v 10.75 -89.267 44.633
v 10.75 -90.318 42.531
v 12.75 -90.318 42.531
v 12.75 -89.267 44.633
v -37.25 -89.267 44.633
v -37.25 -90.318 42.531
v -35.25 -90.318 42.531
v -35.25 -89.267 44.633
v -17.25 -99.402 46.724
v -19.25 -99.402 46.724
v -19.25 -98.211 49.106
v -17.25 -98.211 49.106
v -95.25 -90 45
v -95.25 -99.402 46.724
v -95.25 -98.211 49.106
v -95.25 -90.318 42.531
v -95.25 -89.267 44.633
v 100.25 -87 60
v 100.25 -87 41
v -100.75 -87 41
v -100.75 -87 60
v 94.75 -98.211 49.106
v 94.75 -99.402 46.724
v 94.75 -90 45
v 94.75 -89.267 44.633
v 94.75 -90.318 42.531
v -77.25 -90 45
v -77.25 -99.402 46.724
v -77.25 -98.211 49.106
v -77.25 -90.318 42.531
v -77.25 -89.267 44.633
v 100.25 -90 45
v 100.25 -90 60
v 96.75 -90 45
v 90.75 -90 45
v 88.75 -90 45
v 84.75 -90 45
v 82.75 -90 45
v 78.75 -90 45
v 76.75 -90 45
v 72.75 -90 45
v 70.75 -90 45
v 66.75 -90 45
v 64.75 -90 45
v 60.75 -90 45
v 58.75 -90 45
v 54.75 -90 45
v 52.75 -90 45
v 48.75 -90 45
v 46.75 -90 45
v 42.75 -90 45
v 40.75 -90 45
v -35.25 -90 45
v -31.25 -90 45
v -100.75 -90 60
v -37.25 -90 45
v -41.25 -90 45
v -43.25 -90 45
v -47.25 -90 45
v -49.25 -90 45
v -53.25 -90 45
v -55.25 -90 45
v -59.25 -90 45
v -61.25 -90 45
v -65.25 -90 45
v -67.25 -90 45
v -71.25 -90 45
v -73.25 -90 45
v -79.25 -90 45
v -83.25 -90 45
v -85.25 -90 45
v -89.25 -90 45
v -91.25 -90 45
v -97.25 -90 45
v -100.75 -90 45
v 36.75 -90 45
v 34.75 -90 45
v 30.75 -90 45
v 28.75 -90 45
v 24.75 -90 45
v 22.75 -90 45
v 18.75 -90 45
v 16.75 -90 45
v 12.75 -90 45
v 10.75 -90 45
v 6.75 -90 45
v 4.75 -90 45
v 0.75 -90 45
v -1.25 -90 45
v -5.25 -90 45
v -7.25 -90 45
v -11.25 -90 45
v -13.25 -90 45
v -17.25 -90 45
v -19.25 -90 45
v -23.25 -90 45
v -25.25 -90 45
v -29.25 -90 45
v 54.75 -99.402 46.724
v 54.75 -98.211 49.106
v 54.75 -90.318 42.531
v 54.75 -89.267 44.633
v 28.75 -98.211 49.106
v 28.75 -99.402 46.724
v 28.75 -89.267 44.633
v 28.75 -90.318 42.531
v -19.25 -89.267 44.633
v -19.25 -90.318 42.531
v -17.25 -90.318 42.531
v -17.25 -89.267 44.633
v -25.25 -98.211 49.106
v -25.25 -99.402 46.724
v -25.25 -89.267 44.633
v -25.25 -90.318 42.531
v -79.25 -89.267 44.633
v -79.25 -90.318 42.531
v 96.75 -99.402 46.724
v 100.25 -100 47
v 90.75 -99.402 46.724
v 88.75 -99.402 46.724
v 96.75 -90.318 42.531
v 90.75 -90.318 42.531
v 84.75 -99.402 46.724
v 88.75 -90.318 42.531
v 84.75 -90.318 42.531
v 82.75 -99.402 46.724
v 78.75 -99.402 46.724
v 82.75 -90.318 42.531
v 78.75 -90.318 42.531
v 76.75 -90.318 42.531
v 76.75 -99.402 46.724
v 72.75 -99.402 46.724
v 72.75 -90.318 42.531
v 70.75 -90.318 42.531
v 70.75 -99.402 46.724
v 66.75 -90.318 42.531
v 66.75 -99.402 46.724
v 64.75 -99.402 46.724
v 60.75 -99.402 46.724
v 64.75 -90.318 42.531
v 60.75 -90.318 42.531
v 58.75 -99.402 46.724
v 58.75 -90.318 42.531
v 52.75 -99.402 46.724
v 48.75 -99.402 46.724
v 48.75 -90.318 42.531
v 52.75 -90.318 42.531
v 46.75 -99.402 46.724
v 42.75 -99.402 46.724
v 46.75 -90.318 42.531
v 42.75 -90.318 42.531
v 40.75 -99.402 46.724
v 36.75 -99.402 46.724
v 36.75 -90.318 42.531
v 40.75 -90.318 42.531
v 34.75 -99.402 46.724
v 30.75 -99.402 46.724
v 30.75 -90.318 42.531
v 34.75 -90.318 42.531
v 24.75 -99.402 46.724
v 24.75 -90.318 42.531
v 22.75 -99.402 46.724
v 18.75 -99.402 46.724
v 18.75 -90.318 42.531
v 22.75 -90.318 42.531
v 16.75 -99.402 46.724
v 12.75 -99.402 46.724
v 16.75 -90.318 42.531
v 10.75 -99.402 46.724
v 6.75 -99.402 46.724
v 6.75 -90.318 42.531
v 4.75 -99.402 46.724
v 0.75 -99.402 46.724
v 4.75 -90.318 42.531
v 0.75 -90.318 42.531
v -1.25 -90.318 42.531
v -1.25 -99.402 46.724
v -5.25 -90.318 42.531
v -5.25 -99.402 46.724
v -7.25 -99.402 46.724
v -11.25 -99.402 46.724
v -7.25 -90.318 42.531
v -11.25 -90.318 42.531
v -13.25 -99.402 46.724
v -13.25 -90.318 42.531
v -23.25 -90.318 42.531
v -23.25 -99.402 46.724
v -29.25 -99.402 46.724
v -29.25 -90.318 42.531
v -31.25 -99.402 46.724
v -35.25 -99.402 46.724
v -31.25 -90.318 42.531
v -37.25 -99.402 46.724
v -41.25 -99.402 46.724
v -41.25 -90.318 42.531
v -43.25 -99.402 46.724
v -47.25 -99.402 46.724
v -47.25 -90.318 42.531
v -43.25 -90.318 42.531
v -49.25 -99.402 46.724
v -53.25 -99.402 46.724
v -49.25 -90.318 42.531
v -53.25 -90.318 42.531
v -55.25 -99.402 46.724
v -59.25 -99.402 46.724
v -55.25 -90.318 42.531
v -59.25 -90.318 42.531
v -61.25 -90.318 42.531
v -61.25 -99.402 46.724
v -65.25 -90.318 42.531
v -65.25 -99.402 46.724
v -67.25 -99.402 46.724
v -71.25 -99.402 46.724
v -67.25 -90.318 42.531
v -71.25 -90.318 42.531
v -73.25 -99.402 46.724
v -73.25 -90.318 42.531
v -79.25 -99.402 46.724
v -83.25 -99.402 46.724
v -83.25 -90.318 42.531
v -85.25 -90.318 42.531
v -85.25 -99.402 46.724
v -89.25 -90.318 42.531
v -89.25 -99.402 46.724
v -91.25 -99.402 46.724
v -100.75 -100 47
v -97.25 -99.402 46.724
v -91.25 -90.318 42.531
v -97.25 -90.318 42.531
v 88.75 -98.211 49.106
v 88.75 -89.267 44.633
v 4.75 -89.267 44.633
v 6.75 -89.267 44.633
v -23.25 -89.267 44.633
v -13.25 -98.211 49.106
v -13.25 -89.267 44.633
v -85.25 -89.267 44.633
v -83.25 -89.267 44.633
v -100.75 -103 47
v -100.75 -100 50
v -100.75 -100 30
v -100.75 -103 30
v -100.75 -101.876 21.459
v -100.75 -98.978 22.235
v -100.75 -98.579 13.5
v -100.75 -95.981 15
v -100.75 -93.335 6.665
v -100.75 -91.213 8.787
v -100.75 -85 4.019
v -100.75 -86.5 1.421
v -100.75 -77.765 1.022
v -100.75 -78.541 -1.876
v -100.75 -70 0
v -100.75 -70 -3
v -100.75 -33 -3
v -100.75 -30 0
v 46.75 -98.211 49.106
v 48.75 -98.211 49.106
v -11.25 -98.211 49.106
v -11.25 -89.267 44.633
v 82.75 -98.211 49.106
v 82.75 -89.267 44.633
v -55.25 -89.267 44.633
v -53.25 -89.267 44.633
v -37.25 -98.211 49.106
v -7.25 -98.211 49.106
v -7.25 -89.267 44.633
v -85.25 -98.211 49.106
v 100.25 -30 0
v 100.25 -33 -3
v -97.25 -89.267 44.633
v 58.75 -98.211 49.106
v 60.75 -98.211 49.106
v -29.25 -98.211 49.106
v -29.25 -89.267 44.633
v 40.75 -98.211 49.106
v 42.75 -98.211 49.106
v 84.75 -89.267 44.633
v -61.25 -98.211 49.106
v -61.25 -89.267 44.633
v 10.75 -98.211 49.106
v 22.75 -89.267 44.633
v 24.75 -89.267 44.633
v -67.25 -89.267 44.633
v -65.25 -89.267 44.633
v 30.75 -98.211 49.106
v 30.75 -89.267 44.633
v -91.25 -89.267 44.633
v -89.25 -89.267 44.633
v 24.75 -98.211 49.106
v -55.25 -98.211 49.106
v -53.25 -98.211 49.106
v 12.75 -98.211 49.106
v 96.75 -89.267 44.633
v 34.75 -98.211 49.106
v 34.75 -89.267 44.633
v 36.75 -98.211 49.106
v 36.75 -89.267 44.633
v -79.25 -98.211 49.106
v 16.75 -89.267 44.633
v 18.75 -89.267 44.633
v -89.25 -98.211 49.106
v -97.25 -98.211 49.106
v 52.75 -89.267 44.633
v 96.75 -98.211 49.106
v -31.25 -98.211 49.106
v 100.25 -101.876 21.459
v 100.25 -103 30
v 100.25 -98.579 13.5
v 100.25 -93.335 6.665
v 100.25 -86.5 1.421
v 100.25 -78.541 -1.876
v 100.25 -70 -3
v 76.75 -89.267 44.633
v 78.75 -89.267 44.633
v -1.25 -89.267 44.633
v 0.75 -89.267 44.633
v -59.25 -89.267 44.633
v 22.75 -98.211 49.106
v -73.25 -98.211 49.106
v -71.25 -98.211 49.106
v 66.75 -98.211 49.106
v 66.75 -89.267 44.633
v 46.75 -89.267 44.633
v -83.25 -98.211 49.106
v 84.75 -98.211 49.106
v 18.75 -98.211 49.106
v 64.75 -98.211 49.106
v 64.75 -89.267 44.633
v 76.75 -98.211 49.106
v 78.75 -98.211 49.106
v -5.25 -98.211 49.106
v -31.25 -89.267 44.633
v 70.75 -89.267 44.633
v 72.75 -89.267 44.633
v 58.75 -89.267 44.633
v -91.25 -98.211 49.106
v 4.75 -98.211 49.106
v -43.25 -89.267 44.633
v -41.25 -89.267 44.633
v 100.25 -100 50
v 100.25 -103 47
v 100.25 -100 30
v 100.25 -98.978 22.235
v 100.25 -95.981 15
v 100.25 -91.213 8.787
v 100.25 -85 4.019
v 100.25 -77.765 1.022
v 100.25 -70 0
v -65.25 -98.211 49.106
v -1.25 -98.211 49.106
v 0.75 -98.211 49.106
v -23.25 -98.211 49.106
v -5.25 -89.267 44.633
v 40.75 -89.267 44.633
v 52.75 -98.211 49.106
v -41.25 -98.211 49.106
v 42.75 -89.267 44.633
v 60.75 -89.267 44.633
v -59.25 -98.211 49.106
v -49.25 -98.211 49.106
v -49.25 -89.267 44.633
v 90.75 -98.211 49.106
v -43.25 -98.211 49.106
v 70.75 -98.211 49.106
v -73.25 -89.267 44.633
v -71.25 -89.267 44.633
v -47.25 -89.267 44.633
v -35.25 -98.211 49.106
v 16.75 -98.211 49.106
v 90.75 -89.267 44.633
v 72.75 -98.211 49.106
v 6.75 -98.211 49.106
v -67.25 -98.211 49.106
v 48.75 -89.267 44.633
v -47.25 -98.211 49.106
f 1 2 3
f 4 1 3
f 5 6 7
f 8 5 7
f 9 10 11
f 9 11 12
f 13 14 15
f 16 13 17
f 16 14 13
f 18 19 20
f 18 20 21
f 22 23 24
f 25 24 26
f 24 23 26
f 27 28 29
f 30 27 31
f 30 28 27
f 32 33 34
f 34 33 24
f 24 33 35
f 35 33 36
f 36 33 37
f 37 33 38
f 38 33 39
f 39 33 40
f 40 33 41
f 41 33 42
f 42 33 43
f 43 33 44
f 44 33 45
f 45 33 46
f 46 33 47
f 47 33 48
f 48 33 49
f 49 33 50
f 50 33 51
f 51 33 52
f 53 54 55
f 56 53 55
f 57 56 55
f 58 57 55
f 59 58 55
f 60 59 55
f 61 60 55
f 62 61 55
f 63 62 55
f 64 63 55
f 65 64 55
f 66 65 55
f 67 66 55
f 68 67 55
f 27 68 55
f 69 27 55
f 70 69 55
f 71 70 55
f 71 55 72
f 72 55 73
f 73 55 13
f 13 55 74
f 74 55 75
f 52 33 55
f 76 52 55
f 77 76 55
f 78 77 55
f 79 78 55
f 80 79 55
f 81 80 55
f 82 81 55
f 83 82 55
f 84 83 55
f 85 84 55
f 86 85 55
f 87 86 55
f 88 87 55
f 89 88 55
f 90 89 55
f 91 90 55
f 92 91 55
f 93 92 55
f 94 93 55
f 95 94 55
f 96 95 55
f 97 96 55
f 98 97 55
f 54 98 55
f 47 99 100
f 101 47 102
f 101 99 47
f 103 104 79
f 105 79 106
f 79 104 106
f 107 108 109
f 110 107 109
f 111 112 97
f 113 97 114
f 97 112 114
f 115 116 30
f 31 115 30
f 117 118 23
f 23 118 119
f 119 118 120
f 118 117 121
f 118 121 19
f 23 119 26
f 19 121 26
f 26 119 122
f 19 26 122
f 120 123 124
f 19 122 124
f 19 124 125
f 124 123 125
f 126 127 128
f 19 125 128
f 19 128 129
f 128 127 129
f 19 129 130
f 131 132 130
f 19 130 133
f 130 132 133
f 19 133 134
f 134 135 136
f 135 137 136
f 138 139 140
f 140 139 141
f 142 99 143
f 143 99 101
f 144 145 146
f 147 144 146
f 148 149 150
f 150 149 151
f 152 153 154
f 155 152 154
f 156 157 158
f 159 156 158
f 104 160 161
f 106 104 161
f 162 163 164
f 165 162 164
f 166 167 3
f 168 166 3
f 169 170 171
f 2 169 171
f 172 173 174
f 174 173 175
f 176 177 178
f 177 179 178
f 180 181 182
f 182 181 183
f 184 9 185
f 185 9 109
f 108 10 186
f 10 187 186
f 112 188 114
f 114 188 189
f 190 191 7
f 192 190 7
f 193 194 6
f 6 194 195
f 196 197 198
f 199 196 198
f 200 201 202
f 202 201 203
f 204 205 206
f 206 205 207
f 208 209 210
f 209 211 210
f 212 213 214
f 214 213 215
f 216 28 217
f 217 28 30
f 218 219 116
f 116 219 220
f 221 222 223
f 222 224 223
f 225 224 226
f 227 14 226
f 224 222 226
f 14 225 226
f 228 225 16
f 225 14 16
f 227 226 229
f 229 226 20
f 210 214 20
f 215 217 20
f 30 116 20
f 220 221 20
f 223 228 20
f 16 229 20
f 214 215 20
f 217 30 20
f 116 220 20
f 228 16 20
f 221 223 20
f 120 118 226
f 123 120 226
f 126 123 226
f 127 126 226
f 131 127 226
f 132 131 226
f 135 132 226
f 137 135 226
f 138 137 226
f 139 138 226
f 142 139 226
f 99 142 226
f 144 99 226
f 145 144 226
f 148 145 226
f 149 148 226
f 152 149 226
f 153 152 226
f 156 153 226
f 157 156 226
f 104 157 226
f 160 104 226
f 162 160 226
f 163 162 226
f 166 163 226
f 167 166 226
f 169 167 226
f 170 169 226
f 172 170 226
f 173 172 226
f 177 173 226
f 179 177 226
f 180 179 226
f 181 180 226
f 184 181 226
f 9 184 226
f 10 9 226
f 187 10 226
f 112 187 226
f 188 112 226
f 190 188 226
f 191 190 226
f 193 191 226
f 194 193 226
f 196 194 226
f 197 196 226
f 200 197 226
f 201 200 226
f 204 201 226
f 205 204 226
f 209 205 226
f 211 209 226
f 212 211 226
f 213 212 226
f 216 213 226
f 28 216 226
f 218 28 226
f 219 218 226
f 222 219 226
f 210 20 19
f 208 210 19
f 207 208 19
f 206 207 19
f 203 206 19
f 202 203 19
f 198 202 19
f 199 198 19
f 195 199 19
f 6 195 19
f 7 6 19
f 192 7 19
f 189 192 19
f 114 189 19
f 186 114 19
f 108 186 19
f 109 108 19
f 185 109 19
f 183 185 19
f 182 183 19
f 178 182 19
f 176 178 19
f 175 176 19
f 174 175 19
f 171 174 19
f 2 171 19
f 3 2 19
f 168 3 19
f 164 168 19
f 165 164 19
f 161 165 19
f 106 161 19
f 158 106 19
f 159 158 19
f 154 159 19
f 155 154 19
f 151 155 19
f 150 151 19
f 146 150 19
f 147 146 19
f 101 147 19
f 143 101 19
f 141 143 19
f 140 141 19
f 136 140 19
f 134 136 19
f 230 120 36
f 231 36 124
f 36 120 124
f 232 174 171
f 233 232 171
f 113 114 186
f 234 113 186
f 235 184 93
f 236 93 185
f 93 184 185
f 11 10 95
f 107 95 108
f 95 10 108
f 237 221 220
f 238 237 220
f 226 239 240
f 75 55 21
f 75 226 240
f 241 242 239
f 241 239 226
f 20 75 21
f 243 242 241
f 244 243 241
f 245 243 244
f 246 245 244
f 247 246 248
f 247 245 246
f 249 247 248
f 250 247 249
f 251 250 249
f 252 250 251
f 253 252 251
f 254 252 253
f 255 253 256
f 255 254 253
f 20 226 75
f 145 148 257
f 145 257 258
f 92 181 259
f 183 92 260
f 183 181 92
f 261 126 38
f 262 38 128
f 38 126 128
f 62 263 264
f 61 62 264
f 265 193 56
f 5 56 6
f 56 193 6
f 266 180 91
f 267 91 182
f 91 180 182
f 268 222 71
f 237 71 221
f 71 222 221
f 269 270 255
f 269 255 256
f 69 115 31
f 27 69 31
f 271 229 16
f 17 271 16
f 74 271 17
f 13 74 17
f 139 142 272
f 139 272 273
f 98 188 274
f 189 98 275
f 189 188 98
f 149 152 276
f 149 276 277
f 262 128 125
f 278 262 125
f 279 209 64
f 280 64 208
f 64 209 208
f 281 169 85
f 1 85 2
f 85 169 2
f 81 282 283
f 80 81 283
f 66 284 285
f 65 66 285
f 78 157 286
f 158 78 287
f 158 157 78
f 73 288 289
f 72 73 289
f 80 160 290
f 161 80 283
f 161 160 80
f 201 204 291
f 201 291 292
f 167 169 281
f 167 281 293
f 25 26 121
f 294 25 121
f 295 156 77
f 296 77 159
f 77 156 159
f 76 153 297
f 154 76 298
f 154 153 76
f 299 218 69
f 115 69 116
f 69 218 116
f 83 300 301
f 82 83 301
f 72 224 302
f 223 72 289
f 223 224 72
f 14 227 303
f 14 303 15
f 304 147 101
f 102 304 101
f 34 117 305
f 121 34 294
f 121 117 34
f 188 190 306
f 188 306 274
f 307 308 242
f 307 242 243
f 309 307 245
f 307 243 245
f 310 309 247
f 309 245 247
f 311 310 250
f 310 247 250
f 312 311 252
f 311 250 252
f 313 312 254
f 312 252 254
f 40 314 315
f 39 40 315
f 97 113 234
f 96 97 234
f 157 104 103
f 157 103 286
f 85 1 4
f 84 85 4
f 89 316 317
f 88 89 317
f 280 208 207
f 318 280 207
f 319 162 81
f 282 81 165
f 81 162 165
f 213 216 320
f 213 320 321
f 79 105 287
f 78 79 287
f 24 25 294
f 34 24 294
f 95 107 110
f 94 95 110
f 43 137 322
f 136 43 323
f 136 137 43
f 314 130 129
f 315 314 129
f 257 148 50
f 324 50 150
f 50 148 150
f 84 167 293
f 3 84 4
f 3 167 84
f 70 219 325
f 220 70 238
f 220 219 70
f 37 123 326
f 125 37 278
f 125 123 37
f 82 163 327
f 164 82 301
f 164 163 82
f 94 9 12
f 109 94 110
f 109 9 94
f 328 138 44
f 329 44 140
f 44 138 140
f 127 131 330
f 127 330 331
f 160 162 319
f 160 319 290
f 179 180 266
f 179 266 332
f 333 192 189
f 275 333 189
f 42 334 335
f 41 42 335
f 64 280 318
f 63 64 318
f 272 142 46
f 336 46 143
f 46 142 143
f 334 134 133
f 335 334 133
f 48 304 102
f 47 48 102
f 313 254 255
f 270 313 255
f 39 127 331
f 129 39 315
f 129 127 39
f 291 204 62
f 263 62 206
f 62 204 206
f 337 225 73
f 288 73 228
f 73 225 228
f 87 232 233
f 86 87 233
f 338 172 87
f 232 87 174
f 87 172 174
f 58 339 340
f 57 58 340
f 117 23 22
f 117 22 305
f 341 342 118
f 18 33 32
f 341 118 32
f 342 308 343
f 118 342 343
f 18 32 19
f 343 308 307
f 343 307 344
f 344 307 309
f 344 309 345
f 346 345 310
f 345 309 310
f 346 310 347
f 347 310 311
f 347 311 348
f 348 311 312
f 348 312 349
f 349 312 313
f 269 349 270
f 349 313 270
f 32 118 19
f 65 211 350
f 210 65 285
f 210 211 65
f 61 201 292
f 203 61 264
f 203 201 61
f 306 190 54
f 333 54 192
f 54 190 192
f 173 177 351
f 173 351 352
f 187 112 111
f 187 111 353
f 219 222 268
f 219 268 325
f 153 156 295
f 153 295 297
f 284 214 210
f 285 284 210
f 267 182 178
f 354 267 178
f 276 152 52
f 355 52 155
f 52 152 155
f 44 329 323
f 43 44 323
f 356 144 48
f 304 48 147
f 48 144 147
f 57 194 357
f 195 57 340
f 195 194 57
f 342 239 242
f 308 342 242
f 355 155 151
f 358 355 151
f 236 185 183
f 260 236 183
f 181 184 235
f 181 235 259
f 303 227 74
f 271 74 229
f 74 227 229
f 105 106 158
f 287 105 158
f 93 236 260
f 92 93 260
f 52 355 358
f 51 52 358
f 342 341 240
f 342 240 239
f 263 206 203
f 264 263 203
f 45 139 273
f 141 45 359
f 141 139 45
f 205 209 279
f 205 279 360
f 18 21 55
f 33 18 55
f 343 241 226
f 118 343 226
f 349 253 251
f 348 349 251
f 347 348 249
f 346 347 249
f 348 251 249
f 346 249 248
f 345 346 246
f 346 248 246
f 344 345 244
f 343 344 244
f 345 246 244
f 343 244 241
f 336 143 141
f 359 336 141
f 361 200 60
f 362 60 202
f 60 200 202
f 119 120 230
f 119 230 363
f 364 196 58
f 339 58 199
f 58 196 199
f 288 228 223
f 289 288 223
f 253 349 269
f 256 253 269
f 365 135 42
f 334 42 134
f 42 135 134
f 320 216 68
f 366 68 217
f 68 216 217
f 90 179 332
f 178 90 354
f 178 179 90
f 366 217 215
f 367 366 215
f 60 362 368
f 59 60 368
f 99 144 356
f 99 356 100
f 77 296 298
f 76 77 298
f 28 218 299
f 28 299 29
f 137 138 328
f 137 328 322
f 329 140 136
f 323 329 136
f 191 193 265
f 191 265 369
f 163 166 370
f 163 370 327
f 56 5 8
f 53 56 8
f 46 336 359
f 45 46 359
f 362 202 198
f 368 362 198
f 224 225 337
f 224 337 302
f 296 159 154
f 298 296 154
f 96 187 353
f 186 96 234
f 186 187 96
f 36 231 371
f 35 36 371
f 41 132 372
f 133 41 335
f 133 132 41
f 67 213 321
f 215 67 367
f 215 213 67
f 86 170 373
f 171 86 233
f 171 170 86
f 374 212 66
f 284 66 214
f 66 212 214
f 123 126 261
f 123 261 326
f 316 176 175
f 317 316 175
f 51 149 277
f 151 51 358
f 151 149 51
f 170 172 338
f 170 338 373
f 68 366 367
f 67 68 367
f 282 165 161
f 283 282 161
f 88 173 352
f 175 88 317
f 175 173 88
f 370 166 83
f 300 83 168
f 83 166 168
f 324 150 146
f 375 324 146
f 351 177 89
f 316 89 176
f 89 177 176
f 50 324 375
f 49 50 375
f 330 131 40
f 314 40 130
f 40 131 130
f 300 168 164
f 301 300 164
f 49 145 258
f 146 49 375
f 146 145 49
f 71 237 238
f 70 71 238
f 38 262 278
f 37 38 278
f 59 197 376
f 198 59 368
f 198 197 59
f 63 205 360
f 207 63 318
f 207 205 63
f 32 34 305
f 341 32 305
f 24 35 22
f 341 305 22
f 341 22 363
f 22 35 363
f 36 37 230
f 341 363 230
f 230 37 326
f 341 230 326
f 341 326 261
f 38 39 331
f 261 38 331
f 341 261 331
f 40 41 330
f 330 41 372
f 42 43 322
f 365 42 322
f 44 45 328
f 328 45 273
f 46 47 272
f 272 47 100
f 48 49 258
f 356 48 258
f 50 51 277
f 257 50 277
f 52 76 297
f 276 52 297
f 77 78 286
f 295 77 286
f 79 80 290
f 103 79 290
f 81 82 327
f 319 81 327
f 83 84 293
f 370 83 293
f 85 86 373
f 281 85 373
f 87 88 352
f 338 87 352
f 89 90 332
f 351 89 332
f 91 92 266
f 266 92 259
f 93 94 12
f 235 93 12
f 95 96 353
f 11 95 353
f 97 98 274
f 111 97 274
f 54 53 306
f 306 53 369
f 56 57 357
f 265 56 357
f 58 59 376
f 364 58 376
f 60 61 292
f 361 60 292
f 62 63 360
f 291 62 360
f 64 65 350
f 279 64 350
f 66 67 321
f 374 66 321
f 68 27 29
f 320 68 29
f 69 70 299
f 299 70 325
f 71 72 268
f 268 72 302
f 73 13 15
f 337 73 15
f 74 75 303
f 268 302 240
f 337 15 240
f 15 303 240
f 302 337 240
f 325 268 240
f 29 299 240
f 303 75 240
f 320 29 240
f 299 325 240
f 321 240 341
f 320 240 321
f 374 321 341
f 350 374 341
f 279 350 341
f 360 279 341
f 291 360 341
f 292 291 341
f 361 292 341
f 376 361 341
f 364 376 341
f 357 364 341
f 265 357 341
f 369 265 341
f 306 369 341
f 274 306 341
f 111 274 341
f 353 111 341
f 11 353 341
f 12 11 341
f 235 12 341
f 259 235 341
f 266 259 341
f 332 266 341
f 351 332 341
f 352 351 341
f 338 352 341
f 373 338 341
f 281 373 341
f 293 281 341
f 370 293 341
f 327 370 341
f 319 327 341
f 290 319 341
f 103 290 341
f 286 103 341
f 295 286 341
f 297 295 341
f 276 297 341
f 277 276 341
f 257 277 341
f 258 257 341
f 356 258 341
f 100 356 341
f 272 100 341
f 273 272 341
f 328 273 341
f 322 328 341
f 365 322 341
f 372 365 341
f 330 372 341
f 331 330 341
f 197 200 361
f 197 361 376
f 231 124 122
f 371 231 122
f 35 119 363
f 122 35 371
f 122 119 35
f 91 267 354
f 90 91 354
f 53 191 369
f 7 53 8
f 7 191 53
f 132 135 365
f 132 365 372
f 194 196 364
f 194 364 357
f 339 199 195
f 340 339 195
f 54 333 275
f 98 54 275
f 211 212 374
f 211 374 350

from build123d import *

# Parameters (mm, degrees)
EXTRUDE_1_DEPTH          = 3
EXTRUDE_2_DEPTH          = 287
CUT_EXTRUDE_6_DEPTH      = 100
CUT_EXTRUDE_6_DEPTH_BACK = 100
SKETCH_6_W               = 73.604658964
SKETCH_6_H               = 229.904852756
SKETCH_6_W_2             = 157.433287981
SKETCH_6_H_2             = 225.799979151
SKETCH_7_W               = 3
SKETCH_7_H               = 140
CUT_EXTRUDE_7_DEPTH      = 272.560306378
CUT_EXTRUDE_START        = -2.662708
SKETCH_8_W               = 2
SKETCH_8_H               = 10
CUT_EXTRUDE_8_DEPTH      = 2.662708


with BuildPart() as part:
    # 草图1 → 凸台-拉伸1 (new body)
    with BuildSketch(Plane.XY):
        Polygon((-143.75, 30), (-143.75, 70), (-105.75, 70), (-105.75, 65), (-100.25, 65), (-100.25, 70), (99.75, 70), (99.75, 65), (105.25, 65), (105.25, 70), (143.25, 70), (143.25, 30), (135.25, 30), (135.25, -30), (143.25, -30), (143.25, -70), (105.25, -70), (105.25, -65), (99.75, -65), (99.75, -70), (-100.25, -70), (-100.25, -65), (-105.75, -65), (-105.75, -70), (-143.75, -70), (-143.75, -30), (-135.75, -30), (-135.75, 30), align=None)
    extrude(amount=EXTRUDE_1_DEPTH)

    # 草图2 → 凸台-拉伸2 (add)
    with BuildSketch(Plane.ZY.offset(143.75)):
        with BuildLine():
            Line((0, 70), (0, 30))
            Line((0, 30), (-3, 33))
            Line((-3, 33), (-3, 70))
            ThreePointArc((-3, 70), (6.665476221, 93.334523779), (30, 103))
            Line((30, 103), (47, 103))
            Line((47, 103), (50, 100))
            Line((50, 100), (45, 90))
            Line((45, 90), (60, 90))
            Line((60, 90), (60, 87))
            Line((60, 87), (41, 87))
            Line((41, 87), (47, 100))
            Line((47, 100), (30, 100))
            ThreePointArc((30, 100), (8.786796564, 91.213203436), (0, 70))
        make_face()
        with BuildLine():
            Line((30, -100), (47, -100))
            Line((47, -100), (41, -87))
            Line((41, -87), (60, -87))
            Line((60, -87), (60, -90))
            Line((60, -90), (45, -90))
            Line((45, -90), (50, -100))
            Line((50, -100), (47, -103))
            Line((47, -103), (30, -103))
            ThreePointArc((30, -103), (6.665476221, -93.334523779), (-3, -70))
            Line((-3, -70), (-3, -33))
            Line((-3, -33), (0, -30))
            Line((0, -30), (0, -70))
            ThreePointArc((0, -70), (8.786796564, -91.213203436), (30, -100))
        make_face()
    extrude(amount=-EXTRUDE_2_DEPTH)

    # 草图6 → 切除-拉伸6 (cut, two sides: drawn at the far end of the back side and taken through both)
    with BuildSketch(Plane.XY.offset(-CUT_EXTRUDE_6_DEPTH_BACK)):
        with Locations((137.052329482, -11.952426378)):
            Rectangle(SKETCH_6_W, SKETCH_6_H)
        with Locations((-179.466643991, -9.899989576)):
            Rectangle(SKETCH_6_W_2, SKETCH_6_H_2)
    extrude(amount=CUT_EXTRUDE_6_DEPTH + CUT_EXTRUDE_6_DEPTH_BACK, mode=Mode.SUBTRACT)

    # 草图7 → 切除-拉伸7 (cut, through all)
    with BuildSketch(Plane(origin=(143.25, 0, 0), x_dir=(0, 0, -1), z_dir=(1, 0, 0))):
        with Locations((-1.5, 0)):
            Rectangle(SKETCH_7_W, SKETCH_7_H)
    extrude(amount=-CUT_EXTRUDE_7_DEPTH, mode=Mode.SUBTRACT)


with BuildPart() as body_2:
    # of the pieces the cut leaves, the one that is kept (cut_extrude_7_keep)
    add(part.part.solids().sort_by_distance((-100.75, -70, 0))[0])

    # 草图8 → 切除-拉伸8 (cut)
    with BuildSketch(Plane(origin=(0, 0, 0), x_dir=(1, 0, 0), z_dir=(0, 0.4472135954999584, 0.8944271909999156)).offset(CUT_EXTRUDE_START)):
        with Locations((-96.25, -104.803398875)):
            Rectangle(SKETCH_8_W, SKETCH_8_H)
        with Locations((-90.25, -104.803398875)):
            Rectangle(SKETCH_8_W, SKETCH_8_H)
        with Locations((-84.25, -104.803398875)):
            Rectangle(SKETCH_8_W, SKETCH_8_H)
        with Locations((-78.25, -104.803398875)):
            Rectangle(SKETCH_8_W, SKETCH_8_H)
        with Locations((-72.25, -104.803398875)):
            Rectangle(SKETCH_8_W, SKETCH_8_H)
        with Locations((-66.25, -104.803398875)):
            Rectangle(SKETCH_8_W, SKETCH_8_H)
        with Locations((-60.25, -104.803398875)):
            Rectangle(SKETCH_8_W, SKETCH_8_H)
        with Locations((-54.25, -104.803398875)):
            Rectangle(SKETCH_8_W, SKETCH_8_H)
        with Locations((-48.25, -104.803398875)):
            Rectangle(SKETCH_8_W, SKETCH_8_H)
        with Locations((-42.25, -104.803398875)):
            Rectangle(SKETCH_8_W, SKETCH_8_H)
        with Locations((-36.25, -104.803398875)):
            Rectangle(SKETCH_8_W, SKETCH_8_H)
        with Locations((-30.25, -104.803398875)):
            Rectangle(SKETCH_8_W, SKETCH_8_H)
        with Locations((-24.25, -104.803398875)):
            Rectangle(SKETCH_8_W, SKETCH_8_H)
        with Locations((-18.25, -104.803398875)):
            Rectangle(SKETCH_8_W, SKETCH_8_H)
        with Locations((-12.25, -104.803398875)):
            Rectangle(SKETCH_8_W, SKETCH_8_H)
        with Locations((-6.25, -104.803398875)):
            Rectangle(SKETCH_8_W, SKETCH_8_H)
        with Locations((-0.25, -104.803398875)):
            Rectangle(SKETCH_8_W, SKETCH_8_H)
        with Locations((5.75, -104.803398875)):
            Rectangle(SKETCH_8_W, SKETCH_8_H)
        with Locations((11.75, -104.803398875)):
            Rectangle(SKETCH_8_W, SKETCH_8_H)
        with Locations((17.75, -104.803398875)):
            Rectangle(SKETCH_8_W, SKETCH_8_H)
        with Locations((23.75, -104.803398875)):
            Rectangle(SKETCH_8_W, SKETCH_8_H)
        with Locations((29.75, -104.803398875)):
            Rectangle(SKETCH_8_W, SKETCH_8_H)
        with Locations((35.75, -104.803398875)):
            Rectangle(SKETCH_8_W, SKETCH_8_H)
        with Locations((41.75, -104.803398875)):
            Rectangle(SKETCH_8_W, SKETCH_8_H)
        with Locations((47.75, -104.803398875)):
            Rectangle(SKETCH_8_W, SKETCH_8_H)
        with Locations((53.75, -104.803398875)):
            Rectangle(SKETCH_8_W, SKETCH_8_H)
        with Locations((59.75, -104.803398875)):
            Rectangle(SKETCH_8_W, SKETCH_8_H)
        with Locations((65.75, -104.803398875)):
            Rectangle(SKETCH_8_W, SKETCH_8_H)
        with Locations((71.75, -104.803398875)):
            Rectangle(SKETCH_8_W, SKETCH_8_H)
        with Locations((77.75, -104.803398875)):
            Rectangle(SKETCH_8_W, SKETCH_8_H)
        with Locations((83.75, -104.803398875)):
            Rectangle(SKETCH_8_W, SKETCH_8_H)
        with Locations((89.75, -104.803398875)):
            Rectangle(SKETCH_8_W, SKETCH_8_H)
        with Locations((95.75, -104.803398875)):
            Rectangle(SKETCH_8_W, SKETCH_8_H)
    extrude(amount=CUT_EXTRUDE_8_DEPTH, mode=Mode.SUBTRACT)


solid = body_2.part
